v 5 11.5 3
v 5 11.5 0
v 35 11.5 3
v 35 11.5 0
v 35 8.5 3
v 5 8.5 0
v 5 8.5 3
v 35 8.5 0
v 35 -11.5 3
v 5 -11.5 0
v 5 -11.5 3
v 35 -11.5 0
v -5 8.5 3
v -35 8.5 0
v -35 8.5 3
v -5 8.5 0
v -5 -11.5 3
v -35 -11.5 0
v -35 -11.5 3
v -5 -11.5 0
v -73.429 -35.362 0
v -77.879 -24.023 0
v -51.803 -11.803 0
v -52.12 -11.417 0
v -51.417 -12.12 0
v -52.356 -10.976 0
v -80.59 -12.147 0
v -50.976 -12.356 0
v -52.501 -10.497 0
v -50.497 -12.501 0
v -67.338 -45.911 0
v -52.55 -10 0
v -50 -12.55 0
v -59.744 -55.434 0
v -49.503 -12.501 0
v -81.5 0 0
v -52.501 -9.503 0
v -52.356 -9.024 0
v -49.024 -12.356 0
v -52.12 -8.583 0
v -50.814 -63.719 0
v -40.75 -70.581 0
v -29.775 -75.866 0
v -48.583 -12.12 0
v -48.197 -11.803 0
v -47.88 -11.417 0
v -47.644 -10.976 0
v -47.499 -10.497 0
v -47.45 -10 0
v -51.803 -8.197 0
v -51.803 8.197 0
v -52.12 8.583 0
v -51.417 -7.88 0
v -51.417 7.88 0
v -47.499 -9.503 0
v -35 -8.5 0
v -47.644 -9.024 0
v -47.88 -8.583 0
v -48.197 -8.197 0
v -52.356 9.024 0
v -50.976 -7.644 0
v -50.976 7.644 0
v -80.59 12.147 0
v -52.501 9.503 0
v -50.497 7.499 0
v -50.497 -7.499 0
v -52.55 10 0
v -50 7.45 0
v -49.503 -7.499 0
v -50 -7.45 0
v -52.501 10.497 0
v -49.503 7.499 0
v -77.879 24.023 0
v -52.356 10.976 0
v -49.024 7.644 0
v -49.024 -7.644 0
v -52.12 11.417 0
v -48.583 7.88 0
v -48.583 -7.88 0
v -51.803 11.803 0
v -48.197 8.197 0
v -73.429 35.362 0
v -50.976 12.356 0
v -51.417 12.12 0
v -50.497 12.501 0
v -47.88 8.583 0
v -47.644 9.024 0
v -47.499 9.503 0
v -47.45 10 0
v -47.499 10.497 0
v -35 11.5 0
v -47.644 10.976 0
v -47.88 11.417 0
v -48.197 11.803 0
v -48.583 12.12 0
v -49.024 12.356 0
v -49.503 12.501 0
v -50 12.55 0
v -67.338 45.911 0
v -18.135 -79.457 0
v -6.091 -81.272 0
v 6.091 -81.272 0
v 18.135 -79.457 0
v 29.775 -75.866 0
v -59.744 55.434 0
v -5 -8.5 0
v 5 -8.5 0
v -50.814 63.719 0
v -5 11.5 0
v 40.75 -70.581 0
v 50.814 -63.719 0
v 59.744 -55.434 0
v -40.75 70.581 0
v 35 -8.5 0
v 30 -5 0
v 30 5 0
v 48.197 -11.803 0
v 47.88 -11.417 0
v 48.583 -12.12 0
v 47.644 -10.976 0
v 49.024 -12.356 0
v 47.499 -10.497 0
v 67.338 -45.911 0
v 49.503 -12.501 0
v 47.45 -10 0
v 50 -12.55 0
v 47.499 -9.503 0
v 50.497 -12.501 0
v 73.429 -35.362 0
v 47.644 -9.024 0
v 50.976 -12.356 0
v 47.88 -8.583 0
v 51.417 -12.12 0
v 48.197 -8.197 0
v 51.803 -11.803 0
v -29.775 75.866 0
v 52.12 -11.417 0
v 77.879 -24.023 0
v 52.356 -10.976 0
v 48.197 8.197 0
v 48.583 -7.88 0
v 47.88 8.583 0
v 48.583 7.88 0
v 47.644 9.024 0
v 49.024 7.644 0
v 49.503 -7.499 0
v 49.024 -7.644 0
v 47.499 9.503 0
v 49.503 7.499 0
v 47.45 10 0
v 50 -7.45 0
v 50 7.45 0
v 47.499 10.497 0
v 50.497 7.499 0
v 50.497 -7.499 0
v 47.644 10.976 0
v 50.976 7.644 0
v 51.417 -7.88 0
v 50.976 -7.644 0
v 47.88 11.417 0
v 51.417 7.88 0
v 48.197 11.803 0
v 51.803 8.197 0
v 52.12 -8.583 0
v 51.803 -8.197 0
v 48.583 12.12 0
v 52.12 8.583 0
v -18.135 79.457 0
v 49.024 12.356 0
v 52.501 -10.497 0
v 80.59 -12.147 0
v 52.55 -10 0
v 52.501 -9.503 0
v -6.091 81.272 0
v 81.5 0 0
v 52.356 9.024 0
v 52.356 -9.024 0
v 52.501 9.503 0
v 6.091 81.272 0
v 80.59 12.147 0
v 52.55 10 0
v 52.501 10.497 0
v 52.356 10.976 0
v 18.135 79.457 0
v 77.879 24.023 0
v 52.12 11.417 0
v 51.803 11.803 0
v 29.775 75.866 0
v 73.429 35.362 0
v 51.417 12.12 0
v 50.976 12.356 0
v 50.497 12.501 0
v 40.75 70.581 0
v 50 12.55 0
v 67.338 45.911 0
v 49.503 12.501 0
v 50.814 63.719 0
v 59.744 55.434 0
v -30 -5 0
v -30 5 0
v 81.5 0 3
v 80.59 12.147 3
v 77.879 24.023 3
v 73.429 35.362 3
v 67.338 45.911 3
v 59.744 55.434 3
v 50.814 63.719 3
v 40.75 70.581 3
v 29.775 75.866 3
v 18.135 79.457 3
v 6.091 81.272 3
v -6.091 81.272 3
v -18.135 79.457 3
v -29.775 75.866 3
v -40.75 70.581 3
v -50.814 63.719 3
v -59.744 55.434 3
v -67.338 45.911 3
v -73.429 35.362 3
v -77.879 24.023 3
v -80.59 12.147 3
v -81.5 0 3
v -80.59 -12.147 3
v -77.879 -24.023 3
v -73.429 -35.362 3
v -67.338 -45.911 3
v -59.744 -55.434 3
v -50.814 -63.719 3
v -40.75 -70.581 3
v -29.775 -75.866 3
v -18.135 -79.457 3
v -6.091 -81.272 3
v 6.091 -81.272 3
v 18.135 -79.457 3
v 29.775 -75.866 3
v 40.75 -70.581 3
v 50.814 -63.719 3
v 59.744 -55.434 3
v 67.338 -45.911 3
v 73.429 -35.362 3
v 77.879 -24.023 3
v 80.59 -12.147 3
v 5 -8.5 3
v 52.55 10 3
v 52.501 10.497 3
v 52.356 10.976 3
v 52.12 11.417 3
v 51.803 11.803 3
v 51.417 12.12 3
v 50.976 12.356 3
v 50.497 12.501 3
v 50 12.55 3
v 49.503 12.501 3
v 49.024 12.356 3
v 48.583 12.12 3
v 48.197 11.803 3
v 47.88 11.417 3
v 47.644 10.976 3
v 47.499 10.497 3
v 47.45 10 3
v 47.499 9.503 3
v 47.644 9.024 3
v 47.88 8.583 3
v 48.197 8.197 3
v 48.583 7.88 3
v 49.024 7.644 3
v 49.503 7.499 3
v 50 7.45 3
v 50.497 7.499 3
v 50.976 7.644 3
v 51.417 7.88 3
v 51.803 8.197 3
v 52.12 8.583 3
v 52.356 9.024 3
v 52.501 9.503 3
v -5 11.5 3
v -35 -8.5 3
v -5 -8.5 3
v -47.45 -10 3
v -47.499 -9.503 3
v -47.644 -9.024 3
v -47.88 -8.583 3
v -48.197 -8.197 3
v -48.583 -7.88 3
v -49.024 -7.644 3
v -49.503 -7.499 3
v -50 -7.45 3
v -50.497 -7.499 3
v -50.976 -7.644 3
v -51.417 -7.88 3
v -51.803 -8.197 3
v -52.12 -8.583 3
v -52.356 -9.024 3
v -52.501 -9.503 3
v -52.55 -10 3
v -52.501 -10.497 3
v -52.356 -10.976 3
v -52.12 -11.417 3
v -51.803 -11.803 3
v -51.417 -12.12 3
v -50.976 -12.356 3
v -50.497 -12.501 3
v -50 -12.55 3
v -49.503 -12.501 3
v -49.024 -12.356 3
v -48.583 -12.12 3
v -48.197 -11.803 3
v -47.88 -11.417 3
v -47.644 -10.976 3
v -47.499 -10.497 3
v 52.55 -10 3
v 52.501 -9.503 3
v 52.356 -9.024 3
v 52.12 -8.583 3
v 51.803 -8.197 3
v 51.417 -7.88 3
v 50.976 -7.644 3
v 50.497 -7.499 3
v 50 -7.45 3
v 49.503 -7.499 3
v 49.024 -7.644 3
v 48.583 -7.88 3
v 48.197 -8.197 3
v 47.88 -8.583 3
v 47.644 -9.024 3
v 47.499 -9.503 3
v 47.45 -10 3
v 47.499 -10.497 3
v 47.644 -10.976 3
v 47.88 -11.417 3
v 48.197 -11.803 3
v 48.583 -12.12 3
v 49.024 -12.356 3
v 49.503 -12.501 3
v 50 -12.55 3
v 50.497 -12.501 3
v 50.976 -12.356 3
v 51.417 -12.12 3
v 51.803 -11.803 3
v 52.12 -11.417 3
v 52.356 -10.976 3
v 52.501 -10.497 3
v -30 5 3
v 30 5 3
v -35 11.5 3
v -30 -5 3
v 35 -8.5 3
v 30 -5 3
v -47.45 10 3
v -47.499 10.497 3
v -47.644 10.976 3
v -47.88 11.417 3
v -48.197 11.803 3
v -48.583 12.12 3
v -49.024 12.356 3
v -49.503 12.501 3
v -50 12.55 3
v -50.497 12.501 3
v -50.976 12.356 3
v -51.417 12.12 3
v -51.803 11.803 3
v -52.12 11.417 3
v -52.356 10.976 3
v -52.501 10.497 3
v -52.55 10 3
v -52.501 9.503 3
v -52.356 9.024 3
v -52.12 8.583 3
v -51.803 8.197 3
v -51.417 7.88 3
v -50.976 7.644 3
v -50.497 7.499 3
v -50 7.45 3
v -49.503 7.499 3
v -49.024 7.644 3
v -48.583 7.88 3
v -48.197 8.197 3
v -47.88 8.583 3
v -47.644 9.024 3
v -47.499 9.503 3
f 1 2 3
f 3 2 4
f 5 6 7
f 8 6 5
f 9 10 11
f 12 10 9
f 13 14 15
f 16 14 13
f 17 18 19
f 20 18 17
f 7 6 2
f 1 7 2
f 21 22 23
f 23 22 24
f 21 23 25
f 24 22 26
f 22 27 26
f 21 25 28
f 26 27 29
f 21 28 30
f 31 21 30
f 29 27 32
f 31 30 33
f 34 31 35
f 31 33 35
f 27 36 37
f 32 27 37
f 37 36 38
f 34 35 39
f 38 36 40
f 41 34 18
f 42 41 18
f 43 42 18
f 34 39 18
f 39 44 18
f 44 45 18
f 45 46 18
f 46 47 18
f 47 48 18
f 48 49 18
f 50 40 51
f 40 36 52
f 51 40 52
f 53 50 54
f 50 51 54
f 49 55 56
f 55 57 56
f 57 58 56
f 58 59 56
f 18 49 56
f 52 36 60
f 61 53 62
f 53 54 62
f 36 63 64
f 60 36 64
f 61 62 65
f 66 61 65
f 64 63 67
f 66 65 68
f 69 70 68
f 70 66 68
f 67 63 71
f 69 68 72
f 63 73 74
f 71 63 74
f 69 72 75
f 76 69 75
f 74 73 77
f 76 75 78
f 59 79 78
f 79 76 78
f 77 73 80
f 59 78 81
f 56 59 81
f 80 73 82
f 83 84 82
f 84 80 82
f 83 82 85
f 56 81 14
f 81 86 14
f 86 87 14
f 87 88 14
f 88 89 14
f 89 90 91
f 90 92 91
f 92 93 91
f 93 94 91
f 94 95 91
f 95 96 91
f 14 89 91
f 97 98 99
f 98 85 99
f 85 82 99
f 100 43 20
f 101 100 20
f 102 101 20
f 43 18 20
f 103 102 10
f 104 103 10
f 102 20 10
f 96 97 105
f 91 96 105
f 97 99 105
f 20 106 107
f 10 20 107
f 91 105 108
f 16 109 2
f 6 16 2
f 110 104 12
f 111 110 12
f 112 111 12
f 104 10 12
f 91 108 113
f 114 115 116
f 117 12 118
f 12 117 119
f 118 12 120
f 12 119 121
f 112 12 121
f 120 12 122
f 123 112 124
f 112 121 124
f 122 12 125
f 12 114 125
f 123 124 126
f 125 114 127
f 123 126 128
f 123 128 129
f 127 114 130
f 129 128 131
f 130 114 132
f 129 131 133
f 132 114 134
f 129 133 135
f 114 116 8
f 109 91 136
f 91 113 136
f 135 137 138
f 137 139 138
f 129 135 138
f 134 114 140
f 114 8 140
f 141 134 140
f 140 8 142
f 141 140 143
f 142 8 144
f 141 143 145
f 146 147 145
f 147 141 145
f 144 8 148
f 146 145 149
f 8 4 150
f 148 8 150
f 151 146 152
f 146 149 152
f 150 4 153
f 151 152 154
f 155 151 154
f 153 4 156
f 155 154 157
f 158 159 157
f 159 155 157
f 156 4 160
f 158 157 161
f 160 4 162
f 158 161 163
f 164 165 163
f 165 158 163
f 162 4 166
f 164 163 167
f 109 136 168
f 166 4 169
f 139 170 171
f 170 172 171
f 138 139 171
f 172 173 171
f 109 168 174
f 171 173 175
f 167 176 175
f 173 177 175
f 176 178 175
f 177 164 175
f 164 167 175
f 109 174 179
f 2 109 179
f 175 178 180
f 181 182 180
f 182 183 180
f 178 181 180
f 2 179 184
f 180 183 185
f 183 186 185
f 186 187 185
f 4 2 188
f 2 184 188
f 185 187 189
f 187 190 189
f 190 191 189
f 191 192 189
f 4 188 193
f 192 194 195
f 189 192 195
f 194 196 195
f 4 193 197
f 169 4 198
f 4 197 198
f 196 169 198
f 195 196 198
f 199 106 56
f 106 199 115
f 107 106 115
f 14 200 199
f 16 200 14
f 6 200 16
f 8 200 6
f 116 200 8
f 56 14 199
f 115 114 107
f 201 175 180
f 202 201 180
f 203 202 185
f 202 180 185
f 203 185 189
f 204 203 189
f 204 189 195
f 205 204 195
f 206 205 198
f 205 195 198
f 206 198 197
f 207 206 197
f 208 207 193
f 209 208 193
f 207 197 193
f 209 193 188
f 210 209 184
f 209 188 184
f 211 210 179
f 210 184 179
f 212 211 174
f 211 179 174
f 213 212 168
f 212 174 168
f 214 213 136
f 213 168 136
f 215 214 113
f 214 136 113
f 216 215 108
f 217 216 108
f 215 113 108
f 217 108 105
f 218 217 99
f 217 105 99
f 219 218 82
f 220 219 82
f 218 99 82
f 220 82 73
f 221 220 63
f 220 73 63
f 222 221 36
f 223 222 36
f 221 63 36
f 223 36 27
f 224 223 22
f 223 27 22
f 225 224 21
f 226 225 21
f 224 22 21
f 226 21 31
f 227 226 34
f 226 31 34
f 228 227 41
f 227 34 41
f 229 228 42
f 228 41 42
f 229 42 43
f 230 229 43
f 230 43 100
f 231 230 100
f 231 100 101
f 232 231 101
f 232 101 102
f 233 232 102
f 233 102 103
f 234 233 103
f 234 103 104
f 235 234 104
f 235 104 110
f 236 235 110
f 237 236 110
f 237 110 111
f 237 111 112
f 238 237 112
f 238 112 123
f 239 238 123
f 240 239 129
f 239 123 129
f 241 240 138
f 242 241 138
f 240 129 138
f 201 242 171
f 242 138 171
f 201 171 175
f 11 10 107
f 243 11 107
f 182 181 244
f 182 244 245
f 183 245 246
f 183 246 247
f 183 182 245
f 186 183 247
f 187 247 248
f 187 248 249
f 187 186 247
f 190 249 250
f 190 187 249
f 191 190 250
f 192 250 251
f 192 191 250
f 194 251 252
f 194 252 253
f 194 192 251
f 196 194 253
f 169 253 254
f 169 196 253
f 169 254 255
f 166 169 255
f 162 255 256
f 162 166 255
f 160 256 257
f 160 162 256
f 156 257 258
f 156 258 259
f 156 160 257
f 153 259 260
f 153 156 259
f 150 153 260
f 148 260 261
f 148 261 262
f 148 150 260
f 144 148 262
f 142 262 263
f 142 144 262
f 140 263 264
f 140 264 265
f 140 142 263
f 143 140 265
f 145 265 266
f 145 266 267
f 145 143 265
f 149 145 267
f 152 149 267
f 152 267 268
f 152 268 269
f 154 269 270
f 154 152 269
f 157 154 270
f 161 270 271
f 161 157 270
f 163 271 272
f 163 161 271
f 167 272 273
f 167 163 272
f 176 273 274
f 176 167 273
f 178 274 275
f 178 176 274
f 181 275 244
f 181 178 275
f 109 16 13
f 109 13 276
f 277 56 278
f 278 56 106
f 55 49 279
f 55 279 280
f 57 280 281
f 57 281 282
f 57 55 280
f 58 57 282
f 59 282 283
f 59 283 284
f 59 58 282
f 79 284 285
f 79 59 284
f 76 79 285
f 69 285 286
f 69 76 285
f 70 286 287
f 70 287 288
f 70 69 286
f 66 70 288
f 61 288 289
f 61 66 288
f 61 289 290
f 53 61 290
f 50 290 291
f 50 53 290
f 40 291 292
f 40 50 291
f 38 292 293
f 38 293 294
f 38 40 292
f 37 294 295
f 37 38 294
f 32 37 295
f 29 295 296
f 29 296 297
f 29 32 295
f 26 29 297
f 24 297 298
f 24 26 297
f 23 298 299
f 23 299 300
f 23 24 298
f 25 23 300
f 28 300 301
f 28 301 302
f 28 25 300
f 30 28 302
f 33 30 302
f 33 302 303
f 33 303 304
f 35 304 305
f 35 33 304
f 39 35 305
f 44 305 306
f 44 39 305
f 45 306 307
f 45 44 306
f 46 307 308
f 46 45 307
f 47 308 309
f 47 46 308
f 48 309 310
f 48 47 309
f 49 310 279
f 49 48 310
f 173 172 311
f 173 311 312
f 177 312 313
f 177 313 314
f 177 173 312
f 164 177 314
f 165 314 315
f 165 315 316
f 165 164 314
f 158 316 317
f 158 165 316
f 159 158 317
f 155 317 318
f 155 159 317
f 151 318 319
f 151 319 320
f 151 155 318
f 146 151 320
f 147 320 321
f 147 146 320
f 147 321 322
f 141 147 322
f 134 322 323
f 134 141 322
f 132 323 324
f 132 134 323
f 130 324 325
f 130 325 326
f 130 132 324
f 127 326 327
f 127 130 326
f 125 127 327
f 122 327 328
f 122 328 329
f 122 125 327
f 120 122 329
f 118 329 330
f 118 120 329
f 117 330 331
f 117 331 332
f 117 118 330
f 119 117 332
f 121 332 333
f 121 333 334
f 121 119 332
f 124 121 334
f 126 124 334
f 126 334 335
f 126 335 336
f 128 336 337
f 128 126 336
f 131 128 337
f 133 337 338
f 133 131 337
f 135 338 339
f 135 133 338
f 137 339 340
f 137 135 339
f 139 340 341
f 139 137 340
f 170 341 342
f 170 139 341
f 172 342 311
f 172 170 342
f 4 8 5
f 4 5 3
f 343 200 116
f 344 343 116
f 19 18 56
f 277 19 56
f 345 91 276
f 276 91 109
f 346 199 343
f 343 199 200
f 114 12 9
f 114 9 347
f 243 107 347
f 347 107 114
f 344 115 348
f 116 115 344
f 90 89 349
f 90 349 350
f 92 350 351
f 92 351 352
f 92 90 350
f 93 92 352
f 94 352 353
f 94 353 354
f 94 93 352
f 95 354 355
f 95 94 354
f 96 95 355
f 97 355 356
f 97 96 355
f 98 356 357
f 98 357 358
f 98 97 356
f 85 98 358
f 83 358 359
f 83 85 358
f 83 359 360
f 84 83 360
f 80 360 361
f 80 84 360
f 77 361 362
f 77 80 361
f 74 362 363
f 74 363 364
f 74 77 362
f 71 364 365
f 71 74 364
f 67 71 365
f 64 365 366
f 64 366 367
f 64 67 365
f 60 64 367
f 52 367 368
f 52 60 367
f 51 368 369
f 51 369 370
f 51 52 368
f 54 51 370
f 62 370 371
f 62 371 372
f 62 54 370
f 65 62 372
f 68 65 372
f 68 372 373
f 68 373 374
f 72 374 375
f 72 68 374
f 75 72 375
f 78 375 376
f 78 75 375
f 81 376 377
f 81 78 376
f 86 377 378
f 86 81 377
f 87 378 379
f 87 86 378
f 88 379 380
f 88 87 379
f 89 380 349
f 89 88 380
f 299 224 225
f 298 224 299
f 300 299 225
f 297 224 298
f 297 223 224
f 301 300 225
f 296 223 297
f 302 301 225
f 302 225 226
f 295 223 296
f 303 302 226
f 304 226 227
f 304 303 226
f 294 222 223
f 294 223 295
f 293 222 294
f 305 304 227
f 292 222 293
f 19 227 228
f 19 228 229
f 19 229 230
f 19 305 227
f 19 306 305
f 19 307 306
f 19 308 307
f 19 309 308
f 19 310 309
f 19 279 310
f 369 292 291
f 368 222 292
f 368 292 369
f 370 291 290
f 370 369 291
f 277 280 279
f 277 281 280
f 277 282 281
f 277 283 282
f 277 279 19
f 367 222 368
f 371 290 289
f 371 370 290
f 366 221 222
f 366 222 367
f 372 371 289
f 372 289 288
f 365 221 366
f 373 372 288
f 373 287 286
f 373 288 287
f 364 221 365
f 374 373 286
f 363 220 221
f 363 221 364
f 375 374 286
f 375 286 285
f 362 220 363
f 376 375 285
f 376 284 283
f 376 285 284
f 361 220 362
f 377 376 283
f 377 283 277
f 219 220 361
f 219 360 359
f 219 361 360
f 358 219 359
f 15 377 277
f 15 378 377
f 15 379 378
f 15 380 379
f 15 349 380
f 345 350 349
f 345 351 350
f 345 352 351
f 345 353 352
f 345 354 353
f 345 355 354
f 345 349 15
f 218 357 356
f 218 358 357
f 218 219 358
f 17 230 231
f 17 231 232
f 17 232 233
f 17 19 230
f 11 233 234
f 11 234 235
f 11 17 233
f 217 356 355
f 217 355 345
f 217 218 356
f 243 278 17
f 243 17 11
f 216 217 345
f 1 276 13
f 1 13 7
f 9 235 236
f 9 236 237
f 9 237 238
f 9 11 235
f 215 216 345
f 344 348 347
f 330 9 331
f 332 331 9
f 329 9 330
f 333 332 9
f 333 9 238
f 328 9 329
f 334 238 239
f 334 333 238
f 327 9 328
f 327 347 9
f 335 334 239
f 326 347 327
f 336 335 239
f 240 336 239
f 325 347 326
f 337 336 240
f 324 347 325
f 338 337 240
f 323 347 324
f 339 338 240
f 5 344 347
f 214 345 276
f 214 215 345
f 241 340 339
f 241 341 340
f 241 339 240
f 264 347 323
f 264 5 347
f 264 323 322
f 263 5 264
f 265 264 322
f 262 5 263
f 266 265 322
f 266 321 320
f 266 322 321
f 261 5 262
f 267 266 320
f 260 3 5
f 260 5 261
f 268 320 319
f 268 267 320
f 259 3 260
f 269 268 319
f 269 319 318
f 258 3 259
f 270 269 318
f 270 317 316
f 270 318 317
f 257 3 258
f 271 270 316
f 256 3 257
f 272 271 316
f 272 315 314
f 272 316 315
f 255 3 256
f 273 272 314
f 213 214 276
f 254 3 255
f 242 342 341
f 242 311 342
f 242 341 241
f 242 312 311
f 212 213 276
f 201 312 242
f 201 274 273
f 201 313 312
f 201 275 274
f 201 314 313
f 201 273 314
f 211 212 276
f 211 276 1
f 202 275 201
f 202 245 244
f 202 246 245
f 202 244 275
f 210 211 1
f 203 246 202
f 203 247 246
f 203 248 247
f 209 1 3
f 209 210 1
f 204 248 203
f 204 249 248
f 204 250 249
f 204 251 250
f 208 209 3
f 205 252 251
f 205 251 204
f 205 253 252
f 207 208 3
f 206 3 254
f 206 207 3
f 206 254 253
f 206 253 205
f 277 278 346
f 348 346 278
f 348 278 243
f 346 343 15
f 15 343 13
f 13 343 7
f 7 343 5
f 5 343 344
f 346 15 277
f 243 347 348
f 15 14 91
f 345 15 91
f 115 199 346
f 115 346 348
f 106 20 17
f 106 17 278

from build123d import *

# Parameters (mm, degrees)
F0_R     = 81.5
F0_R_2   = 2.55
F0_W     = 30
F0_H     = 3
F0_W_2   = 60
F0_H_2   = 10
F1_DEPTH = 3


# Not quite as in the source:
# - a feature names something its author has since deleted; it is built from what else it names


with BuildPart() as f1:
    # F0 (on Top) → F1 (new body)
    with BuildSketch(Plane.XY):
        Circle(F0_R)
        with Locations((-50, -10)):
            Circle(F0_R_2, mode=Mode.SUBTRACT)
        with Locations((-20, -10)):
            Rectangle(F0_W, F0_H, mode=Mode.SUBTRACT)
        with Locations((20, -10)):
            Rectangle(F0_W, F0_H, mode=Mode.SUBTRACT)
        with Locations((50, -10)):
            Circle(F0_R_2, mode=Mode.SUBTRACT)
        with Locations((-50, 10)):
            Circle(F0_R_2, mode=Mode.SUBTRACT)
        with Locations((-20, 10)):
            Rectangle(F0_W, F0_H, mode=Mode.SUBTRACT)
        Rectangle(F0_W_2, F0_H_2, mode=Mode.SUBTRACT)
        with Locations((20, 10)):
            Rectangle(F0_W, F0_H, mode=Mode.SUBTRACT)
        with Locations((50, 10)):
            Circle(F0_R_2, mode=Mode.SUBTRACT)
    extrude(amount=F1_DEPTH)


solid = f1.part
